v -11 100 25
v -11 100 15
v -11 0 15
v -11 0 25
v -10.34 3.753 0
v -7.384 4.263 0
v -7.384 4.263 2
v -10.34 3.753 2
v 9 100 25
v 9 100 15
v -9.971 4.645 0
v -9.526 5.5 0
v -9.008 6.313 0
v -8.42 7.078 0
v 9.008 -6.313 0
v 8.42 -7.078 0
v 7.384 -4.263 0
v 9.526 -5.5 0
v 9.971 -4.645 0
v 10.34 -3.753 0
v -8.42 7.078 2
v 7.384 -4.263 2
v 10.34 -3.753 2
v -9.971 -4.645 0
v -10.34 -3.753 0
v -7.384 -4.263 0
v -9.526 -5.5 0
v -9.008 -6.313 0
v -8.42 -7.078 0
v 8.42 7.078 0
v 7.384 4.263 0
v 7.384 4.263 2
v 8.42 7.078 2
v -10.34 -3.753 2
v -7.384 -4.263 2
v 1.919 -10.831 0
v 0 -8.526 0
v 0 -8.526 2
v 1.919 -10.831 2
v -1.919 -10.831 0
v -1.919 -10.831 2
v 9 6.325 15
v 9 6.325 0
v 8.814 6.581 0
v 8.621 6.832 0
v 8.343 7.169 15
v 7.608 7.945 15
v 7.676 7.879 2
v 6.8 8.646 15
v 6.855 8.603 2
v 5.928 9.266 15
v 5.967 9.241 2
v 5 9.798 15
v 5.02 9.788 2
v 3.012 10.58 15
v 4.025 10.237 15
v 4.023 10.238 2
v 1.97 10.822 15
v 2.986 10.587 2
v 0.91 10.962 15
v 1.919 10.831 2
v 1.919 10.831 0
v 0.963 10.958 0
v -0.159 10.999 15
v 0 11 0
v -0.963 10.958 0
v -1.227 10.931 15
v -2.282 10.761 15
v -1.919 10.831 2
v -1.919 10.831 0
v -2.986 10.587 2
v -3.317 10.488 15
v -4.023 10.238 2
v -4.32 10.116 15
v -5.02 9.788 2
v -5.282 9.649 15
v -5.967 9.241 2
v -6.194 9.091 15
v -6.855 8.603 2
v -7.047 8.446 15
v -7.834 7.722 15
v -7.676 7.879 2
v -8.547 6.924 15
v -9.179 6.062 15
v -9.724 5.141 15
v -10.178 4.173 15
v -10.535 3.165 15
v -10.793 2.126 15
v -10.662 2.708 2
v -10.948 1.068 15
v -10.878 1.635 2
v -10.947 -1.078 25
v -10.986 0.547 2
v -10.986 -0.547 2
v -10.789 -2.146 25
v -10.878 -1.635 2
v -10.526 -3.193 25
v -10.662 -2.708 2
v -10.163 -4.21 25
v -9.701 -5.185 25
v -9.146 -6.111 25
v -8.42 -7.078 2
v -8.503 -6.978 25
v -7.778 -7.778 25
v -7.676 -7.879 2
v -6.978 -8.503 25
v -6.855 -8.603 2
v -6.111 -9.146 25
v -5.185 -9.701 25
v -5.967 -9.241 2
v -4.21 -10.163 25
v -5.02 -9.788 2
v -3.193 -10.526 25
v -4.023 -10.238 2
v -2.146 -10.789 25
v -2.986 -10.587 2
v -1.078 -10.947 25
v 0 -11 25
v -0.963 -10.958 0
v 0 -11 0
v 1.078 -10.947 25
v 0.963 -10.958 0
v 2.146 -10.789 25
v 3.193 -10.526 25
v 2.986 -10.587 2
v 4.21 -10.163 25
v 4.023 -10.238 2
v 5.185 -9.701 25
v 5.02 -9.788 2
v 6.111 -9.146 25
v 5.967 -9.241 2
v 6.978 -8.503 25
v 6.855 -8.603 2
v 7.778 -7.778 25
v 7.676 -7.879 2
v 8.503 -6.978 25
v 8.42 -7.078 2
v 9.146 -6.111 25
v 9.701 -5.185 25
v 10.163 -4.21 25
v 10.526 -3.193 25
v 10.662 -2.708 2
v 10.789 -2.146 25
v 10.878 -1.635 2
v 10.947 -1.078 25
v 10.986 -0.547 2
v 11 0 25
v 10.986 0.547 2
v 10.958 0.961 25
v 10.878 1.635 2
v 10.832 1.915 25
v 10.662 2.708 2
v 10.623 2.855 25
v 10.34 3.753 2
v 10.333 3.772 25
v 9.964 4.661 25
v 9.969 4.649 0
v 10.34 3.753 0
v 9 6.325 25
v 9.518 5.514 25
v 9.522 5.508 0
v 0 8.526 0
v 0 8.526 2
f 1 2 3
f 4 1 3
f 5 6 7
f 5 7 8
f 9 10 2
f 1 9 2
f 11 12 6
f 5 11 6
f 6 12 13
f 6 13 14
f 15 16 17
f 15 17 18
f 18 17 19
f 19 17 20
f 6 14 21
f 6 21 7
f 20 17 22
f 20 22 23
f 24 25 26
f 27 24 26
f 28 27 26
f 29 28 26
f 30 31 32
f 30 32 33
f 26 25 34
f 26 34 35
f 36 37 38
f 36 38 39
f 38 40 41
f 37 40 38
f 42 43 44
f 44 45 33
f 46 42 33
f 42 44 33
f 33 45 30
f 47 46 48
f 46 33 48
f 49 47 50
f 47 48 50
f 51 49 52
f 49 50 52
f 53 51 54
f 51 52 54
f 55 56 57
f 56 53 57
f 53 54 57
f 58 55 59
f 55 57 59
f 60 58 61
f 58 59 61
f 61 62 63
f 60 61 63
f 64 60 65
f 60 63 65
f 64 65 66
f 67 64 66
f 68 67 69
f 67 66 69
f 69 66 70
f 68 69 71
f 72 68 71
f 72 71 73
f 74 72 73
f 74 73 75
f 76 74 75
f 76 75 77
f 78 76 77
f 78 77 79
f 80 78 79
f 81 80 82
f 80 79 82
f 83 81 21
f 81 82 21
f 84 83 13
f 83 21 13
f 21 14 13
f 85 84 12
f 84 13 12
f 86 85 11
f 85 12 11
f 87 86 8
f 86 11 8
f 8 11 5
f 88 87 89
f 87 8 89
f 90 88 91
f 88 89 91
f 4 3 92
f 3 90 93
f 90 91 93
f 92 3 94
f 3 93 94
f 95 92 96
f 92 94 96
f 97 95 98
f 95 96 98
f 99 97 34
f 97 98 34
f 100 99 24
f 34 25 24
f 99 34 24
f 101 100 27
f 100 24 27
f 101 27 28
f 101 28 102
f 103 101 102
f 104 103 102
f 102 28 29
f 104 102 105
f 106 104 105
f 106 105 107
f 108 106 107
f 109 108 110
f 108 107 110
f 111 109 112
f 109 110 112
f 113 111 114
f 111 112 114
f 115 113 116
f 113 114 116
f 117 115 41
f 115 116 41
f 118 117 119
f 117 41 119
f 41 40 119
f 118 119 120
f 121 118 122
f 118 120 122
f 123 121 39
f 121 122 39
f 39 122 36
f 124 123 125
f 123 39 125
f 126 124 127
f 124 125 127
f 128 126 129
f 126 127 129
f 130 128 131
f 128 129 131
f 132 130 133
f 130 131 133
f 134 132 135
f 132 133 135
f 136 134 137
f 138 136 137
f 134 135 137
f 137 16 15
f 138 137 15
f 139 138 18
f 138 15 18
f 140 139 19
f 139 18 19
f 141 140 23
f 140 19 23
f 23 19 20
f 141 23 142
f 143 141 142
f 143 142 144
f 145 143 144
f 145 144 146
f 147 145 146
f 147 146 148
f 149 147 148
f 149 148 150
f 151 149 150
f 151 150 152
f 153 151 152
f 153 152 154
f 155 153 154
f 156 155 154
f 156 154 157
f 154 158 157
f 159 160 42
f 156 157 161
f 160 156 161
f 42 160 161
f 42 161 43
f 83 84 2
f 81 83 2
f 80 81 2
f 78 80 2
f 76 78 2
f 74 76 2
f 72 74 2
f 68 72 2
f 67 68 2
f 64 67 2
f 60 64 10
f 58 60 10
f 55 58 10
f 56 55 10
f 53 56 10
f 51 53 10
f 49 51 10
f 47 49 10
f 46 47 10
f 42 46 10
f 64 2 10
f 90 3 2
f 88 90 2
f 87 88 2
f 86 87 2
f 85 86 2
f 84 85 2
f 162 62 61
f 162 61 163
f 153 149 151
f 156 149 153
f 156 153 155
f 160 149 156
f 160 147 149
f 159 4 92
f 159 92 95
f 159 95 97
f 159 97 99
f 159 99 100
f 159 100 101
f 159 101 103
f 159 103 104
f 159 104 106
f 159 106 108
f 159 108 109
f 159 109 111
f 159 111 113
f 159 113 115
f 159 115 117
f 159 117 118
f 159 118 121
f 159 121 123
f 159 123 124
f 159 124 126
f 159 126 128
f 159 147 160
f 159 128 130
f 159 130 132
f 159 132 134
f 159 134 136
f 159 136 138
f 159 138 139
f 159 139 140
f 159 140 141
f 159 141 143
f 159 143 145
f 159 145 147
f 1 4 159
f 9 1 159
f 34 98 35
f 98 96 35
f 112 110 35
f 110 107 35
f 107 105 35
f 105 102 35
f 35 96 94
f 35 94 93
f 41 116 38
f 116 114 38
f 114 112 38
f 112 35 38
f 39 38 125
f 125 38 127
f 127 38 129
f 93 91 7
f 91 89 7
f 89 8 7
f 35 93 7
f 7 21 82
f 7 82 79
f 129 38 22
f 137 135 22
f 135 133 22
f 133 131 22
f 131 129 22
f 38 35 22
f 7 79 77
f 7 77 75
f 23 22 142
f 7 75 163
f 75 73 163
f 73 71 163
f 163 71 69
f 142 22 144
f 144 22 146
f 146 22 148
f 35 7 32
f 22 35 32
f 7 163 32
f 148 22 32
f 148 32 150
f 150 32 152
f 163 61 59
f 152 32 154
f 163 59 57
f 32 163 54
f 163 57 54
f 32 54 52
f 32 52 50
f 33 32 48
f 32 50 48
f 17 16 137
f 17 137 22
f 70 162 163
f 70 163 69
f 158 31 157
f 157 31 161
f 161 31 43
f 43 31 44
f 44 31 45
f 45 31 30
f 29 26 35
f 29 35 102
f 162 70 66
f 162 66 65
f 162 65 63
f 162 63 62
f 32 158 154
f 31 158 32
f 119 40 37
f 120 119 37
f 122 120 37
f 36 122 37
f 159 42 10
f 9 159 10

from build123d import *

# Parameters (mm, degrees)
F1_DEPTH = 20
F2_START = 15
F2_DEPTH = 10
F4_DEPTH = 2.000000095


with BuildPart() as f1:
    # F0 (on Top) → F1 (new body)
    with BuildSketch(Plane.XY):
        with BuildLine():
            Line((9, 0), (-11, 0))
            ThreePointArc((-11, 0), (0, -11), (11, 0))
            ThreePointArc((11, 0), (10.4880884817, 3.3166247904), (9, 6.3245553203))
            Line((9, 6.3245553203), (9, 0))
        make_face()
        with BuildLine():
            ThreePointArc((9, 6.3245553203), (-3.3166247904, 10.4880884817), (-11, 0))
            Line((-11, 0), (9, 0))
            Line((9, 0), (9, 6.3245553203))
        make_face()
    extrude(amount=F1_DEPTH)

    # F0 (on Top) → F2 (join)
    with BuildSketch(Plane.XY.offset(F2_START)):
        with BuildLine():
            Line((9, 0), (-11, 0))
            ThreePointArc((-11, 0), (0, -11), (11, 0))
            ThreePointArc((11, 0), (10.4880884817, 3.3166247904), (9, 6.3245553203))
            Line((9, 6.3245553203), (9, 0))
        make_face()
        with BuildLine():
            Line((-11, 100), (-11, 0))
            ThreePointArc((-11, 0), (-3.3166247904, 10.4880884817), (9, 6.3245553203))
            Line((9, 6.3245553203), (9, 100))
            Line((9, 100), (-11, 100))
        make_face()
        with BuildLine():
            ThreePointArc((9, 6.3245553203), (-3.3166247904, 10.4880884817), (-11, 0))
            Line((-11, 0), (9, 0))
            Line((9, 0), (9, 6.3245553203))
        make_face()
    extrude(amount=F2_DEPTH)

    # F3 (on Top) → F4 (cut)
    with BuildSketch(Plane.XY):
        with BuildLine():
            Line((9.0059984515, -8.6684480671), (7.3840666789, -4.2631928848))
            Line((7.3840666789, -4.2631928848), (12.0100954632, -3.4651994118))
            ThreePointArc((12.0100954632, -3.4651994118), (12.3769178977, -1.7498295216), (12.5, 0))
            ThreePointArc((12.5, 0), (12.3769178977, 1.7498295216), (12.0100954632, 3.4651994118))
            Line((12.0100954632, 3.4651994118), (7.3840666789, 4.2631928848))
            Line((7.3840666789, 4.2631928848), (9.0059984515, 8.6684480671))
            ThreePointArc((9.0059984515, 8.6684480671), (6.25, 10.8253175473), (3.0040970118, 12.133647479))
            Line((3.0040970118, 12.133647479), (0, 8.5263857696))
            Line((0, 8.5263857696), (-3.0040970118, 12.133647479))
            ThreePointArc((-3.0040970118, 12.133647479), (-6.25, 10.8253175473), (-9.0059984515, 8.6684480671))
            Line((-9.0059984515, 8.6684480671), (-7.3840666789, 4.2631928848))
            Line((-7.3840666789, 4.2631928848), (-12.0100954632, 3.4651994118))
            ThreePointArc((-12.0100954632, 3.4651994118), (-12.5, 0), (-12.0100954632, -3.4651994118))
            Line((-12.0100954632, -3.4651994118), (-7.3840666789, -4.2631928848))
            Line((-7.3840666789, -4.2631928848), (-9.0059984515, -8.6684480671))
            ThreePointArc((-9.0059984515, -8.6684480671), (-6.25, -10.8253175473), (-3.0040970118, -12.133647479))
            Line((-3.0040970118, -12.133647479), (0, -8.5263857696))
            Line((0, -8.5263857696), (3.0040970118, -12.133647479))
            ThreePointArc((3.0040970118, -12.133647479), (6.25, -10.8253175473), (9.0059984515, -8.6684480671))
        make_face()
    extrude(amount=F4_DEPTH, mode=Mode.SUBTRACT)


solid = f1.part
